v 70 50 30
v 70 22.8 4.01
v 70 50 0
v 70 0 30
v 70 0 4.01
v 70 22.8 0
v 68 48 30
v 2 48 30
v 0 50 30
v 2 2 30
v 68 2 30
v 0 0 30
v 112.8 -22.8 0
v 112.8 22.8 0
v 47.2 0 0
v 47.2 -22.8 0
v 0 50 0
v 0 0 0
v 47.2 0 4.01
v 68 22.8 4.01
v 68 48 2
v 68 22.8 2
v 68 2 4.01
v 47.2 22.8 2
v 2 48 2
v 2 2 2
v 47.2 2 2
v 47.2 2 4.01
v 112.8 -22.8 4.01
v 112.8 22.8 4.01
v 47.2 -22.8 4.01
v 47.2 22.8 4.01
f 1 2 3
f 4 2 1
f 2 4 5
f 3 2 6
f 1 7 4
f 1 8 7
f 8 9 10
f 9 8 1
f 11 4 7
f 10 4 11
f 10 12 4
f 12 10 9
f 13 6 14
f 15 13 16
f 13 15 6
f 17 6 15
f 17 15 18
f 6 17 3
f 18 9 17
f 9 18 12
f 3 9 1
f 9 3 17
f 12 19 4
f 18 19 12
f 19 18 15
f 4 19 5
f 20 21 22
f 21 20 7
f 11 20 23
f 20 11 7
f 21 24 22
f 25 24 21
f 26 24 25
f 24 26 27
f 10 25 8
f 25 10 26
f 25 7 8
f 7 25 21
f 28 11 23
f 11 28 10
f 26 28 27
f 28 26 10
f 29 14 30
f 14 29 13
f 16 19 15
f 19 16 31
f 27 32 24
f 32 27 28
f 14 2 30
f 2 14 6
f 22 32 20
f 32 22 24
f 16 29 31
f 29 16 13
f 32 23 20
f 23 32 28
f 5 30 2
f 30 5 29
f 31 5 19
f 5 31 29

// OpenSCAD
// Two-part enclosure for small electronics board
// Print orientation: box standing on bed (z = 0), lid on top, printed upside down

// ---------------- Parameters ----------------
box_x      = 70;    // box outer size in X (mm)
box_y      = 50;    // box outer size in Y (mm)
box_z      = 30;    // box outer size in Z (mm)
box_wall   = 2;     // box wall thickness (mm)
box_floor  = 2;     // box floor thickness (mm)

gap        = 10;    // gap between box and lid (mm)

lip_x      = 65.6;  // lid lip outer size in X (mm)
lip_y      = 45.6;  // lid lip outer size in Y (mm)
lip_w      = 1.5;   // lid lip thickness (mm)
lip_h      = 4;     // lid lip height (mm)

eps        = 0.5;   // cutter overshoot past faces (mm)

$fn = 64;

// ---------------- Model ----------------
union() {
    // Box: open-top enclosure
    difference() {
        cube([box_x, box_y, box_z]);
        translate([box_wall, box_wall, box_floor])
            cube([box_x - 2*box_wall, box_y - 2*box_wall, box_z - box_floor + eps]);
    }

    // Lid: plate with a rectangular lip on top, centred
    translate([box_x + gap, 0, 0])
        union() {
            // Base plate
            translate([-lip_x/2, -lip_y/2, 0])
                cube([lip_x, lip_y, lip_w]);
            // Lip, overlapping the plate slightly for a clean union
            translate([-lip_x/2, -lip_y/2, 0])
                cube([lip_x, lip_y, lip_h + 0.01]);
        }
}
